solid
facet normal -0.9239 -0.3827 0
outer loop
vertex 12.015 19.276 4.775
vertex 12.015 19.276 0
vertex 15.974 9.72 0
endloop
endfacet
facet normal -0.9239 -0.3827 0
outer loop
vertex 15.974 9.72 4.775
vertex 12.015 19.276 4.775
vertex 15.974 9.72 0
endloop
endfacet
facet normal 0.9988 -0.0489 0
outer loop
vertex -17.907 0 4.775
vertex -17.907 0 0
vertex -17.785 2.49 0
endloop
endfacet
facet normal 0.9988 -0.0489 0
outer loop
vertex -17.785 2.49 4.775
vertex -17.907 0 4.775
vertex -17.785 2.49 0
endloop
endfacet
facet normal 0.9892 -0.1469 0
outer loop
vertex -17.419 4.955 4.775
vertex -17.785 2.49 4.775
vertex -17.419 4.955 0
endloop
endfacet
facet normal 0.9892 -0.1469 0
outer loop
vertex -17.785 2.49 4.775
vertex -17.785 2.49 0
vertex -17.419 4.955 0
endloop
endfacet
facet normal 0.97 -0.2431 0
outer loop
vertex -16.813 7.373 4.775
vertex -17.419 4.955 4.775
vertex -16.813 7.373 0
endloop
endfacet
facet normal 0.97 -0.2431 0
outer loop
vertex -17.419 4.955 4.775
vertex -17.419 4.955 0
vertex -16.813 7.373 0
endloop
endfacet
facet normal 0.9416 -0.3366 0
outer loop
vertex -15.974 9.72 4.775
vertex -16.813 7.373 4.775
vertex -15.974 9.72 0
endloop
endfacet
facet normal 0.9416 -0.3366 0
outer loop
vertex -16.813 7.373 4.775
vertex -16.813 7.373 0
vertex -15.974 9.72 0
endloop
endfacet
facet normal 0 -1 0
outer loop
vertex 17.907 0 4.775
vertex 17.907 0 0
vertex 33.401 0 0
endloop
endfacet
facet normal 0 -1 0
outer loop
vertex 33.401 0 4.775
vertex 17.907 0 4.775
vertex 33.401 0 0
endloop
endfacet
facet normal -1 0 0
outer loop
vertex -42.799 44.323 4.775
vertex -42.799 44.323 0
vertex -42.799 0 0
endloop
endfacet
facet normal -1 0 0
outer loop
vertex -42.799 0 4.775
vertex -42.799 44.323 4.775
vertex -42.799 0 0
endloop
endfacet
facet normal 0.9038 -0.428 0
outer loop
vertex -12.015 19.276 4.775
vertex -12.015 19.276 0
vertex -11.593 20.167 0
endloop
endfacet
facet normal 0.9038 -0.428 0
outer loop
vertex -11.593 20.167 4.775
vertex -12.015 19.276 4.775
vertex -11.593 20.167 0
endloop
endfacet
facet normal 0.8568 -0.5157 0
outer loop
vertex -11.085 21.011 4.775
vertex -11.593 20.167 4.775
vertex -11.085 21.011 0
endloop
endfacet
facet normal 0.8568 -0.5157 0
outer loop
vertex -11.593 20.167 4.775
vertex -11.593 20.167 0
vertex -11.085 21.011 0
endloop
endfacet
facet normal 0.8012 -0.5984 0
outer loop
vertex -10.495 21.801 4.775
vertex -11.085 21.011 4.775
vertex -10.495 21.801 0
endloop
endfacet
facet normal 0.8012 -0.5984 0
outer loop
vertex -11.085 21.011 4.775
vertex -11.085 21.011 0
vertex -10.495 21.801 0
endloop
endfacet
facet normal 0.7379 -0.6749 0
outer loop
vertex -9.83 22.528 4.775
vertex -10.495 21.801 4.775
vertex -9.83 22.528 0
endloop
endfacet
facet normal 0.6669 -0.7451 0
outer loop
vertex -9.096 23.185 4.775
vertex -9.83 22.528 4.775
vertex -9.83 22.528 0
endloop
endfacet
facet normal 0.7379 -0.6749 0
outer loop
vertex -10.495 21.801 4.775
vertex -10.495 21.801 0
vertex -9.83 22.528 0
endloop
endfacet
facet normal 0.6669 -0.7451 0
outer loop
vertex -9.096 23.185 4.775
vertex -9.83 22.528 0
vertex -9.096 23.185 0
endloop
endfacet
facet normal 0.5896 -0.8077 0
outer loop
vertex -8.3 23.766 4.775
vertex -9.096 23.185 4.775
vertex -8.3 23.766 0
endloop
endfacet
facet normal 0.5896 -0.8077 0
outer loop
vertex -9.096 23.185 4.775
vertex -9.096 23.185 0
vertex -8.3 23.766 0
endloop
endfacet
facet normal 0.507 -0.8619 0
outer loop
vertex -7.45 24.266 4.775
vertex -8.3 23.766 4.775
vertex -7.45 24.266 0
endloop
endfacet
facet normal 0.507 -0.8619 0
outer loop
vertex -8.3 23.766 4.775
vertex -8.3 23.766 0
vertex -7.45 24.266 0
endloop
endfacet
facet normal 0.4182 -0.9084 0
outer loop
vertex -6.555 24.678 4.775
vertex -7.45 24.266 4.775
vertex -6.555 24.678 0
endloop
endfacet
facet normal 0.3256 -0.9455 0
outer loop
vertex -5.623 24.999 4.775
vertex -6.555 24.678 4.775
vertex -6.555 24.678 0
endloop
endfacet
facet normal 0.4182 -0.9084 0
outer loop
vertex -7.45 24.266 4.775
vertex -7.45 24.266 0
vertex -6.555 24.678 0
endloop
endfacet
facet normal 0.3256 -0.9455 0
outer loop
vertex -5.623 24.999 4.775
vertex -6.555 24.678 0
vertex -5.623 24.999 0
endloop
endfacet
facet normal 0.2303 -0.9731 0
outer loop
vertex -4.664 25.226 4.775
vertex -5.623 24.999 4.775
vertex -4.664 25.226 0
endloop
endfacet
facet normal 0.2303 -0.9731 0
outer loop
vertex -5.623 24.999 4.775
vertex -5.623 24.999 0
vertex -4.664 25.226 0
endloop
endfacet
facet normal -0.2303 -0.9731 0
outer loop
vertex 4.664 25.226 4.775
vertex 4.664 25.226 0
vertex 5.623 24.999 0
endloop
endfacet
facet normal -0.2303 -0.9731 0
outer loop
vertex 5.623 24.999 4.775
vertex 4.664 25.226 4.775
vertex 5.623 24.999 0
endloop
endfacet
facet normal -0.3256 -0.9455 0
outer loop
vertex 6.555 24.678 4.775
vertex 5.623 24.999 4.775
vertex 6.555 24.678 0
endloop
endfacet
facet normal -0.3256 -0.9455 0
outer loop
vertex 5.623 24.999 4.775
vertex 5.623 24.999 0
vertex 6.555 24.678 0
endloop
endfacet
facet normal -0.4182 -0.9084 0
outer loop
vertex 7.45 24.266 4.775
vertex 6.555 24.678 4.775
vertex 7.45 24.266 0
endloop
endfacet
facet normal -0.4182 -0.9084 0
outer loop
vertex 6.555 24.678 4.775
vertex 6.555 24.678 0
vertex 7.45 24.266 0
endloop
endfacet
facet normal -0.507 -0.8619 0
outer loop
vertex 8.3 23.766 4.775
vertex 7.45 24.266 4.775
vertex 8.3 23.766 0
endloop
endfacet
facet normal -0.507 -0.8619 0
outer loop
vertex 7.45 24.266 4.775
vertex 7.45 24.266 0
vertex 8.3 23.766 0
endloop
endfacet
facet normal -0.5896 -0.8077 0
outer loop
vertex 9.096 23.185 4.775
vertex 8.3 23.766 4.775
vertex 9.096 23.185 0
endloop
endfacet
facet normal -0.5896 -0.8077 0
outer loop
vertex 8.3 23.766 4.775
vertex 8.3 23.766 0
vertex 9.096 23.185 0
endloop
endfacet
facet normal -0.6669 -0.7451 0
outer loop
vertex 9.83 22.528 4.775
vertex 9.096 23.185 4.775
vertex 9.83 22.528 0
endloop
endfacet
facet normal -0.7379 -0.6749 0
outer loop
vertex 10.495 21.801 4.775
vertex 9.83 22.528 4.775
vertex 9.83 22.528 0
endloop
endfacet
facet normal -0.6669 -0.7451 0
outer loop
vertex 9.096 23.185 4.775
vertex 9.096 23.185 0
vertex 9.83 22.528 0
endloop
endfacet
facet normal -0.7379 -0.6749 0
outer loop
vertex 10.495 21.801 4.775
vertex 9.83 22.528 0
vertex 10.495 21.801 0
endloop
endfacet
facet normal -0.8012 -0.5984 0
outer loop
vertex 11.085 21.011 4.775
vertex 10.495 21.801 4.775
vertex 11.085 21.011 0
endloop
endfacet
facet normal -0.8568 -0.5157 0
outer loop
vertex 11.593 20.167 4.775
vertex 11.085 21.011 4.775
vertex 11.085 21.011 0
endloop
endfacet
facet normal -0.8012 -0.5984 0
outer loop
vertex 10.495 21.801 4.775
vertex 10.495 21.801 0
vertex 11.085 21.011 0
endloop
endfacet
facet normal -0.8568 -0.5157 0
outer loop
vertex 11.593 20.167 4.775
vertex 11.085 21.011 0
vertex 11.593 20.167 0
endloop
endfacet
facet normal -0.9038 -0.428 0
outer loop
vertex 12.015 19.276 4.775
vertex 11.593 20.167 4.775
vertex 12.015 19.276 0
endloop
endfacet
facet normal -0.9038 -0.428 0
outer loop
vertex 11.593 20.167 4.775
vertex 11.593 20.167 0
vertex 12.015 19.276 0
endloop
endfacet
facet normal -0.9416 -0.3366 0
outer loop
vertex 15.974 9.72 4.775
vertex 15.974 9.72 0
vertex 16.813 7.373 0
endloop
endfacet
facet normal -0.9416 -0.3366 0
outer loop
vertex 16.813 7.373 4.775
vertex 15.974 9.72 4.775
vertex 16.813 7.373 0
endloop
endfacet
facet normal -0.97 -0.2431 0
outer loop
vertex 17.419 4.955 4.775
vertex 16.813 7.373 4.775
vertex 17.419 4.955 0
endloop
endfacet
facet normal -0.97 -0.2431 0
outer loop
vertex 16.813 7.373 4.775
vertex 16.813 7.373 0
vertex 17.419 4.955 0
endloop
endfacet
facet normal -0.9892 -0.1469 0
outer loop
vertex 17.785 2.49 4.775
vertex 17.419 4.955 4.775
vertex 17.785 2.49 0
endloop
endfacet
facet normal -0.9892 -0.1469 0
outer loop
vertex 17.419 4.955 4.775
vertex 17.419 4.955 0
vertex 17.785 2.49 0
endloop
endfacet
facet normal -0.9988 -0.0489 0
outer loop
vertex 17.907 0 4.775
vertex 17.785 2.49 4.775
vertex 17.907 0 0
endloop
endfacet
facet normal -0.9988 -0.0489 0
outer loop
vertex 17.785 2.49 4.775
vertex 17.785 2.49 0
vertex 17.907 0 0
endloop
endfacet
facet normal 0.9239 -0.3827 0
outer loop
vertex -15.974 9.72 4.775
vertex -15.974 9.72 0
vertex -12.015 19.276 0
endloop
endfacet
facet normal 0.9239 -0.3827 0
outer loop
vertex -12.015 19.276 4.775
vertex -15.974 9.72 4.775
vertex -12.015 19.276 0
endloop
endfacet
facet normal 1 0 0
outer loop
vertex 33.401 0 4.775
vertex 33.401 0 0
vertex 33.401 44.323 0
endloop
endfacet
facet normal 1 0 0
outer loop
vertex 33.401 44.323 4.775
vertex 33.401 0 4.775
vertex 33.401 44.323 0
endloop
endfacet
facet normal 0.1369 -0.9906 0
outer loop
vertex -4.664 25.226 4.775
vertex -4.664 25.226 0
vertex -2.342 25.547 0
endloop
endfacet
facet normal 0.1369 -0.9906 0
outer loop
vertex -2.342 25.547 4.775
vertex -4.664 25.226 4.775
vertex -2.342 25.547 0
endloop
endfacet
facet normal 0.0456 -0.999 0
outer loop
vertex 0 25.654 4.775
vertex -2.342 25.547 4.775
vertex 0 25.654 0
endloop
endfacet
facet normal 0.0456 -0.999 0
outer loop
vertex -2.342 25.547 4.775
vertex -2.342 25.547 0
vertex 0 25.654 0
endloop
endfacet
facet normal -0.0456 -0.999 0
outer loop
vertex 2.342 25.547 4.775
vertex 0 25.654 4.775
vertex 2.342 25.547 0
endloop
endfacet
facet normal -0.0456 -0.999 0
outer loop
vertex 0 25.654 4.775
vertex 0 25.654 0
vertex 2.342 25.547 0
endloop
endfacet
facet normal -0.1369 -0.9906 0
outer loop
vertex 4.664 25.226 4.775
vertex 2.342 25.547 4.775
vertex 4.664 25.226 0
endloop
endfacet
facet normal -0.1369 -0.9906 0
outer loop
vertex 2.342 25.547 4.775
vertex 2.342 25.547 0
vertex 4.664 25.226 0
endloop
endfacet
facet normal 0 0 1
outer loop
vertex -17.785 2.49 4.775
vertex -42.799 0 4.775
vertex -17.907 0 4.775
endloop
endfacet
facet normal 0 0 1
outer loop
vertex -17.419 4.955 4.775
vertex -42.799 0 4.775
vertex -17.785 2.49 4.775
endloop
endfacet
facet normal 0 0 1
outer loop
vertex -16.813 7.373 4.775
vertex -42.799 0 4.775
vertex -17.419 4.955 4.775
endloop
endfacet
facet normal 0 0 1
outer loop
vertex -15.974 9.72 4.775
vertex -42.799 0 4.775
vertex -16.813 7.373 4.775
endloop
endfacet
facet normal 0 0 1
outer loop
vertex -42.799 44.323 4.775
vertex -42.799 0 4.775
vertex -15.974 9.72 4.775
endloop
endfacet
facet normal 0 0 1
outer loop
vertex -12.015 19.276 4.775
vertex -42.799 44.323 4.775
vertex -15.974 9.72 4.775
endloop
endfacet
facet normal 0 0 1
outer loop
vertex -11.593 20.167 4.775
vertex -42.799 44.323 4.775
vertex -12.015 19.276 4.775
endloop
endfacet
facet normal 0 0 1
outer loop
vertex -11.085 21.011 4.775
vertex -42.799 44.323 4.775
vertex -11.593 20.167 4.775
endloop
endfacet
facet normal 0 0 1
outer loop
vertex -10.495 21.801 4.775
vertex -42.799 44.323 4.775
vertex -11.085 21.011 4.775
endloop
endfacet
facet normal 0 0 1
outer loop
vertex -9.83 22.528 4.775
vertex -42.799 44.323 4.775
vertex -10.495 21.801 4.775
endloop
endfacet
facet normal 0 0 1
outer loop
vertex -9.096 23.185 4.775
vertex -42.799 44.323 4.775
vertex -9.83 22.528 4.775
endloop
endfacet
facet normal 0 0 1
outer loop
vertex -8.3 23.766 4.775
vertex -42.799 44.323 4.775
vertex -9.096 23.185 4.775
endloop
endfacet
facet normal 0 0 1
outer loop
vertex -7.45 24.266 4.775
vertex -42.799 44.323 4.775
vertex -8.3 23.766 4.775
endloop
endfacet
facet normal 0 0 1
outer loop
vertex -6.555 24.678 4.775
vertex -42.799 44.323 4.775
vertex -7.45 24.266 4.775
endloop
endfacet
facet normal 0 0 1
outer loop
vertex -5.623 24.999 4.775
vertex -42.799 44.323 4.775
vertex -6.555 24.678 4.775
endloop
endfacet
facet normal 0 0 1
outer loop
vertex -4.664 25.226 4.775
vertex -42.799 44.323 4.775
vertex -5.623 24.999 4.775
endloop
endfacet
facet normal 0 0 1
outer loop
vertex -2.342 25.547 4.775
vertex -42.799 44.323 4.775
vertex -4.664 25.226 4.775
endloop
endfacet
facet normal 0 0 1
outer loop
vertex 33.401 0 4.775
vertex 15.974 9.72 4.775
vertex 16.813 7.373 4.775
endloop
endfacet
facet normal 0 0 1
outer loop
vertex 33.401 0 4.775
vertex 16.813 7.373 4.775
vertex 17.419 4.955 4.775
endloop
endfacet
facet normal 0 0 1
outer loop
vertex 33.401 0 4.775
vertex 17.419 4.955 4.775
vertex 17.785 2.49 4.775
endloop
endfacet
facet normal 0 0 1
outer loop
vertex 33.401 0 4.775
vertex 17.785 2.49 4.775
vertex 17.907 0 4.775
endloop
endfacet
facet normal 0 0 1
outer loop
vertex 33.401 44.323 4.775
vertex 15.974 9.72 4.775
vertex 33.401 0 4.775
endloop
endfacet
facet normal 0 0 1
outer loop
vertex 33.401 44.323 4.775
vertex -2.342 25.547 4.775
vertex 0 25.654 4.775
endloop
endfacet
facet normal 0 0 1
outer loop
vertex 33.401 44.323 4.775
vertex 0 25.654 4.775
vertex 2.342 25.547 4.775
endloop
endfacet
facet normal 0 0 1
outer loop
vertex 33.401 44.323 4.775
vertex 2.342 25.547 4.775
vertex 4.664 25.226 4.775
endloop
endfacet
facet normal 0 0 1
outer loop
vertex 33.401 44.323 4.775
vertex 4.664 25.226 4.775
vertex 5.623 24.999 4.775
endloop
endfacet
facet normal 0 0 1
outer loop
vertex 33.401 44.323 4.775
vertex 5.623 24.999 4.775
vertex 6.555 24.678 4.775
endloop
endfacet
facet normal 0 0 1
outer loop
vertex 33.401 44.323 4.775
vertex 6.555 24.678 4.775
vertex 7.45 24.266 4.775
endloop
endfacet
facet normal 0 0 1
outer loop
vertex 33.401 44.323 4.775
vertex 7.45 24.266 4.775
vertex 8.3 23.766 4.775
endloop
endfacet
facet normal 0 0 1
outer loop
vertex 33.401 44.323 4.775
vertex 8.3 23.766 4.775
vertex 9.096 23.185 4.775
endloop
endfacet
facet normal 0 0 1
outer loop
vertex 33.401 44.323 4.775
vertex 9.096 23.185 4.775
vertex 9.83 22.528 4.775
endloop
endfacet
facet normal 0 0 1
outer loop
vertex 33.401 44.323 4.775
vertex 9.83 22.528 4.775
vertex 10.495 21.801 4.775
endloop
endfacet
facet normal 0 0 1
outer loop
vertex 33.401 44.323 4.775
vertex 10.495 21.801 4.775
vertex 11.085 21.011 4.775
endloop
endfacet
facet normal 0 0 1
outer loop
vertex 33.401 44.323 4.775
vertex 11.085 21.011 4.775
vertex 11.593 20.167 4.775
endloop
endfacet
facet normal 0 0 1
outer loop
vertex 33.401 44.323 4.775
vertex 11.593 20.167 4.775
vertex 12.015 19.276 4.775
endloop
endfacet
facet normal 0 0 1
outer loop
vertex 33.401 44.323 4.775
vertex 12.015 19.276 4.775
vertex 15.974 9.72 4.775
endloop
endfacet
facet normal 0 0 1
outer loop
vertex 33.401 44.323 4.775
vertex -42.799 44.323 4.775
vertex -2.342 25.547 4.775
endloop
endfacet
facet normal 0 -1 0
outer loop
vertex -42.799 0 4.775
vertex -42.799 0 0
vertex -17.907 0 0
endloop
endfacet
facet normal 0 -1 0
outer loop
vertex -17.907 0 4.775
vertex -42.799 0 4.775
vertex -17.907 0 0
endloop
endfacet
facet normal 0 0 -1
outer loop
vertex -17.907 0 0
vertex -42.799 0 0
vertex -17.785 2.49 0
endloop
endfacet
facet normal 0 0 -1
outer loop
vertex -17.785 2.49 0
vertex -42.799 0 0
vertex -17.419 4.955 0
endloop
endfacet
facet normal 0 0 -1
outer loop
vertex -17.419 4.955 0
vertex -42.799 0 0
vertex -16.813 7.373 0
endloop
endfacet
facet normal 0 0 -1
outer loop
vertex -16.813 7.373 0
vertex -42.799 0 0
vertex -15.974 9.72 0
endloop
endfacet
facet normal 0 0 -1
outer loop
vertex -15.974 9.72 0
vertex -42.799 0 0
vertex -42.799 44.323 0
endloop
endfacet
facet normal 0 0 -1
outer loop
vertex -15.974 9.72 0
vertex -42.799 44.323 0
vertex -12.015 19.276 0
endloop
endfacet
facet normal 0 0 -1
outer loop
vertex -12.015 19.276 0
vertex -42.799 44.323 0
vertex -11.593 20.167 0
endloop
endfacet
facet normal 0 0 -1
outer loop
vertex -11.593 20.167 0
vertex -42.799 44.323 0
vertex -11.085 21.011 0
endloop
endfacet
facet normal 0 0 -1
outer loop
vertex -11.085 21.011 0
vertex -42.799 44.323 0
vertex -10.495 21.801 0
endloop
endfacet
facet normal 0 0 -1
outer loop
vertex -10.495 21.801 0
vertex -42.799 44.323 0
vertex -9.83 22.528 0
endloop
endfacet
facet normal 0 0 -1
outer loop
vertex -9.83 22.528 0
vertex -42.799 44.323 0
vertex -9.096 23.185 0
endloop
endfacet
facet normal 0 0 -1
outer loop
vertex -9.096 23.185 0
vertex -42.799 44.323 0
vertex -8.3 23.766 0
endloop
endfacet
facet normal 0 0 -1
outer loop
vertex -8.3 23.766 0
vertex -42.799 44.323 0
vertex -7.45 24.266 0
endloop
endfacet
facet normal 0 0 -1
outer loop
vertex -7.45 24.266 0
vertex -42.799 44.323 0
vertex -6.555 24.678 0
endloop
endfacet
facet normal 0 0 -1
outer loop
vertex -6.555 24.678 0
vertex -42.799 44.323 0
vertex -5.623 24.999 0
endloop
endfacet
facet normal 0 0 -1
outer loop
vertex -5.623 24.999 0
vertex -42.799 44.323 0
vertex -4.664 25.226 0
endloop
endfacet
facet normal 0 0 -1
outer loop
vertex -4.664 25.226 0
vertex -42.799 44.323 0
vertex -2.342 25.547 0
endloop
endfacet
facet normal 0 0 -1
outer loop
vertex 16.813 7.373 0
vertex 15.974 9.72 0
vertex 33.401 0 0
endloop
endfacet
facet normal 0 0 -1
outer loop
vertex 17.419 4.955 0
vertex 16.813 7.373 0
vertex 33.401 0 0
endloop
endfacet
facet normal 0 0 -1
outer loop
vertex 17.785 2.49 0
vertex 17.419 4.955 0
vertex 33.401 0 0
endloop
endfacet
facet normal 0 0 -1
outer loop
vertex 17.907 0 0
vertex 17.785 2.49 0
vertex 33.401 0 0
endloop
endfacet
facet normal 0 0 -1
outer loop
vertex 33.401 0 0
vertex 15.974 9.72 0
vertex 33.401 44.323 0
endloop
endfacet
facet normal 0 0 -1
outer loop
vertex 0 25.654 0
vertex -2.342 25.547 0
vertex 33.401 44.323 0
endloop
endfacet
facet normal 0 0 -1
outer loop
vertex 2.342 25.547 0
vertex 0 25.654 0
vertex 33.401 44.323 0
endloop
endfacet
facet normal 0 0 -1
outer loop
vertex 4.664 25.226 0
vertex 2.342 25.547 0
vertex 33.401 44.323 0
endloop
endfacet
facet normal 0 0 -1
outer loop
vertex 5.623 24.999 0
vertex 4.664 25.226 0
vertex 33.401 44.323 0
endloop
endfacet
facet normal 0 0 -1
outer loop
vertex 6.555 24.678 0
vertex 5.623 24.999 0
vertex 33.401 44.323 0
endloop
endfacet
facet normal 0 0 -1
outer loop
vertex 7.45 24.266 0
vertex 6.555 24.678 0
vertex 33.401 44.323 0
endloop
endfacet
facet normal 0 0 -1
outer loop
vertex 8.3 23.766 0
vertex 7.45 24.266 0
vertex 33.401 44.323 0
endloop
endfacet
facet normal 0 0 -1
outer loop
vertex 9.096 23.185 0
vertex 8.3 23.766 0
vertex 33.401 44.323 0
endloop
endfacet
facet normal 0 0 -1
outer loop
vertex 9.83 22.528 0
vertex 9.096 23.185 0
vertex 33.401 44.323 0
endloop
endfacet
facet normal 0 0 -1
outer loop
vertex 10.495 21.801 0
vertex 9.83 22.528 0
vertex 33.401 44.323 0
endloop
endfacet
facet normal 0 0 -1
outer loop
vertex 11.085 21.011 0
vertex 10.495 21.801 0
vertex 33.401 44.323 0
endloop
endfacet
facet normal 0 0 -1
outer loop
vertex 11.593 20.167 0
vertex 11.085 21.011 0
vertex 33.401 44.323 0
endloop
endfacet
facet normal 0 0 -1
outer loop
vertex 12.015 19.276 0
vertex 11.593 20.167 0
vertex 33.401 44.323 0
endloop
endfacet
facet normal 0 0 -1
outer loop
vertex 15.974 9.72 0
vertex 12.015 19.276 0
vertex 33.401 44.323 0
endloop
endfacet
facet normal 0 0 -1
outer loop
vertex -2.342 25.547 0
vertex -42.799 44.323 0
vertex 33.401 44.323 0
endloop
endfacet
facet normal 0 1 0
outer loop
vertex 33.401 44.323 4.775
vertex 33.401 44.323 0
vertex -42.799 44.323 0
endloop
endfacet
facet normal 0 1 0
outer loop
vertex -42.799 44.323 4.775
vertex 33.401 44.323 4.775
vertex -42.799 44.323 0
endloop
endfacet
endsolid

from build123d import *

# Parameters (mm, degrees)
F1_DEPTH = 4.7752


with BuildPart() as f1:
    # F0 (on Top) → F1 (new body)
    with BuildSketch(Plane.XY):
        with BuildLine():
            Line((33.401, 44.323), (-42.799, 44.323))
            Line((-42.799, 44.323), (-42.799, 0))
            Line((-42.799, 0), (-17.907, 0))
            ThreePointArc((-17.907, 0), (-17.418946, 4.955294), (-15.97354, 9.720159))
            Line((-15.97354, 9.720159), (-12.015225, 19.276377))
            ThreePointArc((-12.015225, 19.276377), (-9.095689, 23.185245), (-4.664367, 25.226403))
            ThreePointArc((-4.664367, 25.226403), (0, 25.654), (4.664367, 25.226403))
            ThreePointArc((4.664367, 25.226403), (9.095689, 23.185245), (12.015225, 19.276377))
            Line((12.015225, 19.276377), (15.97354, 9.720159))
            ThreePointArc((15.97354, 9.720159), (17.418946, 4.955294), (17.907, 0))
            Line((17.907, 0), (33.401, 0))
            Line((33.401, 0), (33.401, 44.323))
        make_face()
    extrude(amount=F1_DEPTH)


solid = f1.part
